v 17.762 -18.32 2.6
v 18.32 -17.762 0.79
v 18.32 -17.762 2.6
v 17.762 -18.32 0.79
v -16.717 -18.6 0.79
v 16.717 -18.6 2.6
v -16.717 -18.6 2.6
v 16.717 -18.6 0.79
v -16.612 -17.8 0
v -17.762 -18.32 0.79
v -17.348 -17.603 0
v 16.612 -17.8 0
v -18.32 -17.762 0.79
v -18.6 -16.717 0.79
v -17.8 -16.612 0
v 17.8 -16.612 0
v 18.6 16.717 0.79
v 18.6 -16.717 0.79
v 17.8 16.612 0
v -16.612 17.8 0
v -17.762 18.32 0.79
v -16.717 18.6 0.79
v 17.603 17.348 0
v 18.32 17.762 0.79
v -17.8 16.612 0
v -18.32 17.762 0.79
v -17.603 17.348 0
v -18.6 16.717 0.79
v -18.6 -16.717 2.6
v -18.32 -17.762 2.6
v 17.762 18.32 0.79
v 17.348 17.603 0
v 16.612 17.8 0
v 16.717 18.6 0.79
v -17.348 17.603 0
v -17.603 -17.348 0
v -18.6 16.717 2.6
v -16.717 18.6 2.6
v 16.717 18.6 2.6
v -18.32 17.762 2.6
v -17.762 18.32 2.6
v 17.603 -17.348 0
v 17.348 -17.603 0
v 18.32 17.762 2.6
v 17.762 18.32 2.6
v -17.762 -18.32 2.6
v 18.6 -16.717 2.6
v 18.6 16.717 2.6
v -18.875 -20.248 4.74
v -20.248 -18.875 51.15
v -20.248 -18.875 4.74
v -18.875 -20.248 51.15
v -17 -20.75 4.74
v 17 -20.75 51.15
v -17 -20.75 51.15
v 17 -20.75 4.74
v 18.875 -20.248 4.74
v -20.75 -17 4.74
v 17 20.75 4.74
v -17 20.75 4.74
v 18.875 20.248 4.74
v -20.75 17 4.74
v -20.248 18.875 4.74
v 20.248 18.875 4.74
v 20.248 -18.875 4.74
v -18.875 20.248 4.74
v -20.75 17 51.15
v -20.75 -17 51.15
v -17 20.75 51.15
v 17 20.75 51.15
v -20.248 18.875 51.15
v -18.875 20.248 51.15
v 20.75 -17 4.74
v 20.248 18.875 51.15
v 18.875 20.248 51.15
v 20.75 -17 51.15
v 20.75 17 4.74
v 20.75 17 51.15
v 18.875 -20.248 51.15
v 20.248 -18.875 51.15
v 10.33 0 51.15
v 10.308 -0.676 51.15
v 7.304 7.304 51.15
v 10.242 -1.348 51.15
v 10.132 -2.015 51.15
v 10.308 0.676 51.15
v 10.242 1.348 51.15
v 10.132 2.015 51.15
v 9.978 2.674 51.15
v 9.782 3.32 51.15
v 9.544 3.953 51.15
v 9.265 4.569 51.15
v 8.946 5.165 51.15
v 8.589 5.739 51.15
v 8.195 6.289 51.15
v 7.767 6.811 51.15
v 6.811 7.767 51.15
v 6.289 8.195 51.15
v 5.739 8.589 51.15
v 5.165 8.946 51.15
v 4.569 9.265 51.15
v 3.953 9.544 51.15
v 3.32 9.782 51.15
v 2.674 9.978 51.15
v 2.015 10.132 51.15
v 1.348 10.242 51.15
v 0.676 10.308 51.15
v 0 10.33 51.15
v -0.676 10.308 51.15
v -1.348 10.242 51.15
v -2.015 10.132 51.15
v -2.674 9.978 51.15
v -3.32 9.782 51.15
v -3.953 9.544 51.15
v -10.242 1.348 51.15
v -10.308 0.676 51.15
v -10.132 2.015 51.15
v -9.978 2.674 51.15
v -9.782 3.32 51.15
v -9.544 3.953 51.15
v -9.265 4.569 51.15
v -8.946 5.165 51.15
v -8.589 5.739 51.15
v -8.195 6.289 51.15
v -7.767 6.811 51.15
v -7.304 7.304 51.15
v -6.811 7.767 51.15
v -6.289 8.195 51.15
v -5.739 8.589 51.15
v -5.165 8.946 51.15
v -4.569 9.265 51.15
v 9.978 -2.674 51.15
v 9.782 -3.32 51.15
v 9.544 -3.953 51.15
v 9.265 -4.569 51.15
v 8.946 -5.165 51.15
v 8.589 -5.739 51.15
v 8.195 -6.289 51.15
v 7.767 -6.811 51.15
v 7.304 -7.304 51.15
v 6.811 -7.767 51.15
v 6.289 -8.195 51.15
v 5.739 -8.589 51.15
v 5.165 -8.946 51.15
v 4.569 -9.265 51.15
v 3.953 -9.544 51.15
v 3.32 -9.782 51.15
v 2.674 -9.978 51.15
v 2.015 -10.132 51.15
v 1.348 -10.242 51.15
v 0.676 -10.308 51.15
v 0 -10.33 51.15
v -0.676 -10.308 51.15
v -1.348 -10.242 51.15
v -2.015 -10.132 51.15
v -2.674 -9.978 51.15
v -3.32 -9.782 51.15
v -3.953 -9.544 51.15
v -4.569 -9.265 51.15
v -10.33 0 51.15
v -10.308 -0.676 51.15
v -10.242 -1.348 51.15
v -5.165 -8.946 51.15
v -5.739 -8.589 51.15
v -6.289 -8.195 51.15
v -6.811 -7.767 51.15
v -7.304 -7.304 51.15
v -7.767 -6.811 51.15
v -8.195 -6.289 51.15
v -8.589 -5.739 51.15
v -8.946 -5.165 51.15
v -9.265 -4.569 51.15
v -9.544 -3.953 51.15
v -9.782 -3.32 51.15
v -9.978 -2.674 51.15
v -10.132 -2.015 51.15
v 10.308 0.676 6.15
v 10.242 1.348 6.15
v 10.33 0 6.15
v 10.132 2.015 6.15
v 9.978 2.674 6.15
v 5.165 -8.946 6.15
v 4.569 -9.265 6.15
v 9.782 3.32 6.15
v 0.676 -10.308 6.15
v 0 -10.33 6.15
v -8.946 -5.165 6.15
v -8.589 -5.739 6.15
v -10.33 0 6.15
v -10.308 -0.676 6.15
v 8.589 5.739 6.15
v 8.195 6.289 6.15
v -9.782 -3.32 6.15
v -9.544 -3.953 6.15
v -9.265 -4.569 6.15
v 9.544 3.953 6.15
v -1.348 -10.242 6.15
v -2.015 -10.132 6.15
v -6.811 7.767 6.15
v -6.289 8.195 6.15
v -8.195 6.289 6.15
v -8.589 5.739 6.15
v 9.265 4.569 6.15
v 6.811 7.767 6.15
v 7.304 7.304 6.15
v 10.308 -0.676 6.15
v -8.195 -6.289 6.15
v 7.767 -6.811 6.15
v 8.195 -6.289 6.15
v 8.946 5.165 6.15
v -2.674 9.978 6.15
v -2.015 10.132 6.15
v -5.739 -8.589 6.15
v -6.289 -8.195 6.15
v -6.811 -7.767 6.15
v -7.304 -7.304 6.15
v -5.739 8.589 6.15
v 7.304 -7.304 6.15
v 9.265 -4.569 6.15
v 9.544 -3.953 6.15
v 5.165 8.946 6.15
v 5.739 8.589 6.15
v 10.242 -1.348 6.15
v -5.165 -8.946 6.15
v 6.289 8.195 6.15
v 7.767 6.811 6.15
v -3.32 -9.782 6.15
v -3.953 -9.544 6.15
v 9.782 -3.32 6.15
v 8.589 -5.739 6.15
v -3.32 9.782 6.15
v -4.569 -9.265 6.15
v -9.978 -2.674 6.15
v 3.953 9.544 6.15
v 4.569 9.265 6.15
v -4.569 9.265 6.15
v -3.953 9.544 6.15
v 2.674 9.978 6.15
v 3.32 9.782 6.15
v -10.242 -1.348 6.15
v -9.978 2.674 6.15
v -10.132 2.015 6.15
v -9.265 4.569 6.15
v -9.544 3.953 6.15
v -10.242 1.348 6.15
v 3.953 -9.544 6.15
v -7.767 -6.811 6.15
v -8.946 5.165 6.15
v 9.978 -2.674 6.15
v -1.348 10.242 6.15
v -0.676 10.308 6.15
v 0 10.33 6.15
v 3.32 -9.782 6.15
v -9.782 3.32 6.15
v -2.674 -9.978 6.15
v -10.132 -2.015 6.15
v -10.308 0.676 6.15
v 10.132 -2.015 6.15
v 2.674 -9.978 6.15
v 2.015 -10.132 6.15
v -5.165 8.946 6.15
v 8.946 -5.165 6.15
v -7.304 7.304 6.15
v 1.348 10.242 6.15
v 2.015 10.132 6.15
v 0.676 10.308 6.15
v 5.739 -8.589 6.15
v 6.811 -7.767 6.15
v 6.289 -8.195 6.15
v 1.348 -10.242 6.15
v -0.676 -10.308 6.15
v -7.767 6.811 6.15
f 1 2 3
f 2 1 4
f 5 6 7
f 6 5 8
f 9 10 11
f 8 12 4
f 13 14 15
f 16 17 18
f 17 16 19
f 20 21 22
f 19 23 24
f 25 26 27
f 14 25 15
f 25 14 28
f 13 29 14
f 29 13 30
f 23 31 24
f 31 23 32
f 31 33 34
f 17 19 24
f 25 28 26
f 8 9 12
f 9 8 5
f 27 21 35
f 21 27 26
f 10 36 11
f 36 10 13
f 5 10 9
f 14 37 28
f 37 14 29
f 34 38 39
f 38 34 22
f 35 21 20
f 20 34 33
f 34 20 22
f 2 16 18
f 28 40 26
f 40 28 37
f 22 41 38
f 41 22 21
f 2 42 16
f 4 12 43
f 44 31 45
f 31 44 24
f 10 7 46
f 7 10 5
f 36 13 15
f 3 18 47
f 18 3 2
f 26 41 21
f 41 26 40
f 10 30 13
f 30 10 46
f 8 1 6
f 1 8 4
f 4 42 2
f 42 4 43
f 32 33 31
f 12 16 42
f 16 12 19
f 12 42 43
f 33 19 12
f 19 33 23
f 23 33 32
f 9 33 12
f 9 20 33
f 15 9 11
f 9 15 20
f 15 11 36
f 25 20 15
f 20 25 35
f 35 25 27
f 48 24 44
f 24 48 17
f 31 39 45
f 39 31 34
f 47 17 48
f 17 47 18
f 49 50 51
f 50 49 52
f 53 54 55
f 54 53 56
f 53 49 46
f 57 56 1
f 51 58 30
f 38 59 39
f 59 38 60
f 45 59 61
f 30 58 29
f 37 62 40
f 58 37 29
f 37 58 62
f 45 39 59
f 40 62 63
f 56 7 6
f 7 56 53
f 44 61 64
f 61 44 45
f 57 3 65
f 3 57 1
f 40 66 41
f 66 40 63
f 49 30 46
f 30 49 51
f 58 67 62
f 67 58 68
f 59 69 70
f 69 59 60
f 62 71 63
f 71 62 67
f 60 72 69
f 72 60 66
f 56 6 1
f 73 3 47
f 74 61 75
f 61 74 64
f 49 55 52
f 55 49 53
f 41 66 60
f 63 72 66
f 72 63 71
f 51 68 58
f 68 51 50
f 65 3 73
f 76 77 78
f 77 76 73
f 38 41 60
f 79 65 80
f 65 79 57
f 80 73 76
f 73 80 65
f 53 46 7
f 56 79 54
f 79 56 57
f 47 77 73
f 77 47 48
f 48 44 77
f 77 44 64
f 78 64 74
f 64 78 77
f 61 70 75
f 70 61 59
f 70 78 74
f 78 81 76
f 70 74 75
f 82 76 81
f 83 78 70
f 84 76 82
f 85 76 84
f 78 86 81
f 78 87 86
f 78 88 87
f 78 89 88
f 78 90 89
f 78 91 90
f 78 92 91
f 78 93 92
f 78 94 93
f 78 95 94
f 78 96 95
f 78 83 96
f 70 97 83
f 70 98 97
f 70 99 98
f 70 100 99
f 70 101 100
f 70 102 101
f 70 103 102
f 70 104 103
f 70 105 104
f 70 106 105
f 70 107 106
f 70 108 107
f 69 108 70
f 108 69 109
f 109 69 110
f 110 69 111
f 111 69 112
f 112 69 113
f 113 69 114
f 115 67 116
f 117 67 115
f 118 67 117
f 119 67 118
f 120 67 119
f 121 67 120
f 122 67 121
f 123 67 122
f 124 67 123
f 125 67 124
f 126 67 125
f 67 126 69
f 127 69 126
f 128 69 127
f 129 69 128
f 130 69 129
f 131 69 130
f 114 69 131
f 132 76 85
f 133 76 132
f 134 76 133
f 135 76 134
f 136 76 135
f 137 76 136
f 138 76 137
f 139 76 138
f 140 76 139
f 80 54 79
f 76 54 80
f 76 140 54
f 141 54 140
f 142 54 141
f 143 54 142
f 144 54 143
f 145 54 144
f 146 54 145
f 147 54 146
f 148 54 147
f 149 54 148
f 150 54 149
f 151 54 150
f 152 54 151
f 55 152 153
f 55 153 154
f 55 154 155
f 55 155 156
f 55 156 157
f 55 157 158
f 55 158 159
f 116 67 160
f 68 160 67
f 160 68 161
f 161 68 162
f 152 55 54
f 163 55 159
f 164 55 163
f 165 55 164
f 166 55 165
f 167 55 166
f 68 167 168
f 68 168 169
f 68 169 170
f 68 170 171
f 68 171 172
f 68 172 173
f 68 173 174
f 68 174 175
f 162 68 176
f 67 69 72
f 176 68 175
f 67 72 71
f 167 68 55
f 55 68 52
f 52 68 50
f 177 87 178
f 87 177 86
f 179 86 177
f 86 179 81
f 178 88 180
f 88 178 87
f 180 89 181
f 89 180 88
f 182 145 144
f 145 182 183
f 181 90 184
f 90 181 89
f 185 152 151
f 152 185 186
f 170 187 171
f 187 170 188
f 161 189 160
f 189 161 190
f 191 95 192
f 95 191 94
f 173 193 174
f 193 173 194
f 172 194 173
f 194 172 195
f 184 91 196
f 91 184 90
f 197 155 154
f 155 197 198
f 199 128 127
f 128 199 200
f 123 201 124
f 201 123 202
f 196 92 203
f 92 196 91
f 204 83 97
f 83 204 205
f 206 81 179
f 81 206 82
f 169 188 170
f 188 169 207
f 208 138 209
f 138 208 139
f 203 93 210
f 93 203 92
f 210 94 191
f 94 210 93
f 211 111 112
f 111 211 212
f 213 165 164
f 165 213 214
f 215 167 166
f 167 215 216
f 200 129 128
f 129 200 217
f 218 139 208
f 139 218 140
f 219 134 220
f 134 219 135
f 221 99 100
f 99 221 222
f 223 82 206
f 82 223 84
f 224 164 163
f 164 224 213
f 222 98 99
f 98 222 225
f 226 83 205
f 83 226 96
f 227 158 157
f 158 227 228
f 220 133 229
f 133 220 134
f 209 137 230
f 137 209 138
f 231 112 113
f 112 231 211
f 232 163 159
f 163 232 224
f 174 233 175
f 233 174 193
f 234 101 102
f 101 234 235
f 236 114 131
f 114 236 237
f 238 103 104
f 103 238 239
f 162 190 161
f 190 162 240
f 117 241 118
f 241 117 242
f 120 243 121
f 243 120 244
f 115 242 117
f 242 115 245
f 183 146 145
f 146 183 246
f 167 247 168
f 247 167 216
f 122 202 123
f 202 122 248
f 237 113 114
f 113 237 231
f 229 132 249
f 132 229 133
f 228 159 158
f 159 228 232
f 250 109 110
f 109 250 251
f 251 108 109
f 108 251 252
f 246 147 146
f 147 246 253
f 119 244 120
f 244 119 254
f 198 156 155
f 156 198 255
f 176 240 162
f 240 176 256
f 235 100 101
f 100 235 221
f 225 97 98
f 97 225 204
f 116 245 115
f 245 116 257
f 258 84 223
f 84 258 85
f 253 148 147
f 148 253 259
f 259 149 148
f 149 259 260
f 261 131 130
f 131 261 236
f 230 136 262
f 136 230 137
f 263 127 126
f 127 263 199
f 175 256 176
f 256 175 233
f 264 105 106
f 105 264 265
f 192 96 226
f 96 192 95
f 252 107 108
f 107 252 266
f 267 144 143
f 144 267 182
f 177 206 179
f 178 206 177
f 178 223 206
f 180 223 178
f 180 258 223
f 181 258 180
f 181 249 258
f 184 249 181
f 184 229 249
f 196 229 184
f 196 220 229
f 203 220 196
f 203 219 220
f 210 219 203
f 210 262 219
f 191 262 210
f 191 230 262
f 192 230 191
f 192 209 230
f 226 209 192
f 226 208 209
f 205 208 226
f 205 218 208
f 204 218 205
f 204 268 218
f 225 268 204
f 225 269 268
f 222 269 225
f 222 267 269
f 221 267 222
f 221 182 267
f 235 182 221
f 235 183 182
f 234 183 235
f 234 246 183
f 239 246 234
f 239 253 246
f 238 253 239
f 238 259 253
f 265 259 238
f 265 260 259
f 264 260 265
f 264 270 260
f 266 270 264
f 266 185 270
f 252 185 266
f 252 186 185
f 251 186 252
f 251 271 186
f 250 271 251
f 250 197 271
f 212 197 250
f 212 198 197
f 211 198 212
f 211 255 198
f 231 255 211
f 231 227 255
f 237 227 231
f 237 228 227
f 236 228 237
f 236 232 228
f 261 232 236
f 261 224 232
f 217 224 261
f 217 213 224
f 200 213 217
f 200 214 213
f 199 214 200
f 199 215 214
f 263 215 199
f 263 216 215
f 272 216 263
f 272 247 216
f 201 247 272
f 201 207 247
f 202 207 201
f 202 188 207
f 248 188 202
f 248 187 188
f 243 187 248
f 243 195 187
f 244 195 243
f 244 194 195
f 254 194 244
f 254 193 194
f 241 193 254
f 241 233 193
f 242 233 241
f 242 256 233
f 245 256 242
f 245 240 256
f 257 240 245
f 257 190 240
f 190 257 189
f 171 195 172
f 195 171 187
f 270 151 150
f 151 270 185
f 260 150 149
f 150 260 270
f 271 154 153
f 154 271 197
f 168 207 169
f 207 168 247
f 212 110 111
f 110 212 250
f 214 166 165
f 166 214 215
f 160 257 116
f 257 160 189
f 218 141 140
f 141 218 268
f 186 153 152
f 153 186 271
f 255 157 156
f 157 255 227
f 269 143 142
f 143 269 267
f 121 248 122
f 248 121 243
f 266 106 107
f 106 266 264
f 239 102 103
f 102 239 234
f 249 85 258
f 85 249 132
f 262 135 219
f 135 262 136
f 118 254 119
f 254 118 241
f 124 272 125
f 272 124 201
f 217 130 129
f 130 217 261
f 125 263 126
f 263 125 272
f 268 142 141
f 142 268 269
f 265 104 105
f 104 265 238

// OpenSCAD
// file: ../lib/vessel.scad
// SPDX-License-Identifier: MIT
// Copyright (c) 2026 Aaron Cupp
//
// vessel.scad — parametric collar cups for bottles, cans, and pen-form tools.
//
// A collar cup is a solid Gridfinity block with cylindrical bores sunk into it.
// It LOCATES a vessel; it does not clamp one. That distinction is the whole
// design: a collar that grips harder than the bin weighs comes out of the
// baseplate with the bottle when you grab it one-handed. Clearance, not
// interference — CLR is per-diameter, not per-side.
//
// Capture depth is roughly a third of the vessel's height. Enough to resist a
// knock (this bench sits under a 180 W fume-extractor intake), not so much that
// you're fishing the bottle out.
//
//   collar_cup(nx, ny, vessel_d, capture_h, …)   — one centred bore
//   collar_cup_multi(nx, ny, bores, capture_h, …) — bores = [[x, y, d], …]
//
// Cord slot: pen-form tools that stand in a cup are usually corded (the HARDELL
// rotary tool takes a barrel jack). Without a slot the lead drapes over the rim
// and levers the tool sideways. `cord_w > 0` cuts a channel from the bore out
// through the wall, open to the top.

include <gridfinity.scad>

CLR      = 1.0;   // bore = vessel_d + CLR. Loose on purpose — see above.
MIN_WALL = 1.2;   // minimum material between two bores, and bore to outer face

// ---- geometry guards ----
// Overlapping bores and bores that break out through the side wall both still
// render as perfectly watertight, 2-manifold meshes — CI cannot tell you the
// part is wrong, only that it is closed. These asserts encode the intent that
// the mesh check can't. Cheap, and they fire at render time rather than on the
// printer.
function _pair_gaps(bores, clr) = [
    for (i = [0 : len(bores)-1], j = [0 : len(bores)-1]) if (i < j)
        norm([bores[i][0]-bores[j][0], bores[i][1]-bores[j][1]])
        - (bores[i][2]+clr)/2 - (bores[j][2]+clr)/2
];
function _edge_gaps(bores, clr, W, D) = [
    for (b = bores) min(W/2 - abs(b[0]) - (b[2]+clr)/2,
                        D/2 - abs(b[1]) - (b[2]+clr)/2)
];

// Multi-bore block. Bores are [x, y, diameter] in mm, relative to the block centre.
module collar_cup_multi(nx, ny, bores, capture_h, floor = 1.4, clr = CLR,
                        cord_w = 0, cord_at = 0, min_wall = MIN_WALL) {
    h = BIN_BASE_H + floor + capture_h;
    e = 0.1;
    W = nx*GF - 0.5; D = ny*GF - 0.5;
    _pg = _pair_gaps(bores, clr);
    _eg = _edge_gaps(bores, clr, W, D);
    assert(len(_pg) == 0 || min(_pg) >= min_wall,
           "collar_cup: bores are too close — they would merge into one pocket");
    assert(min(_eg) >= min_wall,
           "collar_cup: a bore breaches the outer wall — block needs more units");
    difference() {
        bin_blank(nx, ny, h);
        for (b = bores)
            translate([b[0], b[1], BIN_BASE_H + floor])
                cylinder(d = b[2] + clr, h = capture_h + e, $fn = 96);
        // Cord channel: from the first bore outward through the +X wall, open to
        // the rim so the lead drops in from above rather than threading.
        if (cord_w > 0)
            translate([bores[0][0], bores[0][1] - cord_w/2, BIN_BASE_H + floor + cord_at])
                cube([nx*GF, cord_w, h]);
    }
}

// Single centred bore — the common case.
module collar_cup(nx, ny, vessel_d, capture_h, floor = 1.4, clr = CLR,
                  cord_w = 0, cord_at = 0, min_wall = MIN_WALL) {
    collar_cup_multi(nx, ny, [[0, 0, vessel_d]], capture_h, floor, clr,
                     cord_w, cord_at, min_wall);
}

// Evenly spaced row of same-depth bores along X — for a rank of aerosol cans.
// Returns geometry, not a list; pass the diameters and it lays them out on the
// block's centre line.
module collar_cup_row(nx, ny, diameters, capture_h, floor = 1.4, clr = CLR,
                      min_wall = MIN_WALL) {
    n = len(diameters);
    pitch = nx * GF / n;
    collar_cup_multi(nx, ny,
        [for (i = [0 : n-1]) [(i - (n-1)/2) * pitch, 0, diameters[i]]],
        capture_h, floor, clr, 0, 0, min_wall);
}
// file: engraver_common.scad
// engraver_common — shared numbers for the SMALL ENGRAVER rotary tool.
//
// THIS IS NOT THE HARDELL. `rotary-tool-station/` is HARDELL-only and none of
// its body numbers transfer — different tool, different diameter, different
// length, different bit count. The two were briefly conflated and the engraver's
// gauge result was very nearly written into the HARDELL's bit block, which would
// have recalibrated a part nobody had measured for.
//
// ---- KNOWN ----
//
// BIT_BORE is the one number that matters here, and it is a MEASUREMENT, not a
// derivation. `rotary-tool-station/coupons/bit_fit_gauge.scad` was printed
// 2026-08-25 — five holes, 2.5 / 2.6 / 2.7 / 2.8 / 2.9, each engraved — and the
// engraver's bits go into the **2.7**. The 2.6 does not take them.
//
// WHY THAT UNBLOCKS THE BIT BLOCK WITHOUT KNOWING THE COLLET SIZE. The gauge
// reads the FINISHED HOLE, which folds the shank diameter and this printer's
// hole shrinkage into a single number. That is the only number a drilled block
// needs. Calipers on a bit would give half of it and still leave the shrinkage
// unknown, which is exactly why the coupon exists. The collet's nominal size
// stays unmeasured and stays irrelevant — the cup is bored from the body, not
// the collet.
BIT_BORE  = 2.70;   // [2:0.05:5] ✅ gauge result 2026-08-25 — the finished hole
BIT_COUNT = 35;     // ✅ counted 2026-08-25
BIT_COLS  = 7;      // [3:1:14] 7 × 5 = 35 on a 1×1
BIT_ROWS  = 5;      // [2:1:8]
BIT_CAPTURE = 18;   // [8:1:40] bits are light; 18 keeps the block low

// ---- body, re-attributed from rotary-tool-station 2026-08-25 ----
//
// These two were recorded as the HARDELL's for months. The HARDELL measures
// 28 mm at the base tapering to ≈30, so 19.66 cannot be it — and it matches the
// ~20 mm this tool reads across to within 0.34 mm. `bin_tool.scad` moved here
// with them, as `bin_tool_engraver.scad`.
TOOL_D   = 19.66;   // body diameter — ✅ re-attributed, corroborated by "20 across"
TOOL_L   = 131.36;  // ⚠️ overall length — re-attributed on the SAME reasoning
                    //   (recorded beside the 19.66 in one session), which is
                    //   inference rather than a reading. Put a tape on the
                    //   engraver end to end: ≈131 settles it.
TOOL_CAPTURE = 45;  // [20:1:80] ≈ a third of TOOL_L
CORD_W       = 0;   // no slot — it charges from the base, not a lead
// main file
// bin_tool_engraver — 1×1 cup, the small engraver standing vertical.
//
// No cord slot: it charges from the base.
//
// ⚠️ THIS FILE MOVED, AND THAT MOVE IS THE WHOLE STORY. It lived in
// `rotary-tool-station/` as `bin_tool.scad`, labelled the HARDELL's cup, bored
// to ⌀19.66. On 2026-08-25 the HARDELL was measured at **28 mm at the base,
// tapering to ≈30** — so 19.66 was never the HARDELL. It is this tool, matching
// the ~20 mm the engraver reads across to within 0.34 mm.
//
// The cup was correct all along; only the label was wrong. Had it been printed
// under the old name it would simply not have taken the HARDELL, and no mesh
// check, assert, or CI job could have caught that — the part was watertight,
// manifold and exactly the size it claimed to be. Only a caliper on the right
// tool finds this class of error.
//
// TOOL_L is re-attributed on the same reasoning: it was recorded beside the
// 19.66 in one session, so it is almost certainly this tool's. Marked ⚠️ until
// somebody puts a tape on the engraver end to end.
//
// PRINT: as emitted, feet down. No supports.
//
// SPDX-License-Identifier: CC-BY-NC-4.0
// Copyright (c) 2026 Aaron Cupp
include <engraver_common.scad>
use <../lib/vessel.scad>

collar_cup(1, 1, TOOL_D, TOOL_CAPTURE, cord_w = CORD_W);
